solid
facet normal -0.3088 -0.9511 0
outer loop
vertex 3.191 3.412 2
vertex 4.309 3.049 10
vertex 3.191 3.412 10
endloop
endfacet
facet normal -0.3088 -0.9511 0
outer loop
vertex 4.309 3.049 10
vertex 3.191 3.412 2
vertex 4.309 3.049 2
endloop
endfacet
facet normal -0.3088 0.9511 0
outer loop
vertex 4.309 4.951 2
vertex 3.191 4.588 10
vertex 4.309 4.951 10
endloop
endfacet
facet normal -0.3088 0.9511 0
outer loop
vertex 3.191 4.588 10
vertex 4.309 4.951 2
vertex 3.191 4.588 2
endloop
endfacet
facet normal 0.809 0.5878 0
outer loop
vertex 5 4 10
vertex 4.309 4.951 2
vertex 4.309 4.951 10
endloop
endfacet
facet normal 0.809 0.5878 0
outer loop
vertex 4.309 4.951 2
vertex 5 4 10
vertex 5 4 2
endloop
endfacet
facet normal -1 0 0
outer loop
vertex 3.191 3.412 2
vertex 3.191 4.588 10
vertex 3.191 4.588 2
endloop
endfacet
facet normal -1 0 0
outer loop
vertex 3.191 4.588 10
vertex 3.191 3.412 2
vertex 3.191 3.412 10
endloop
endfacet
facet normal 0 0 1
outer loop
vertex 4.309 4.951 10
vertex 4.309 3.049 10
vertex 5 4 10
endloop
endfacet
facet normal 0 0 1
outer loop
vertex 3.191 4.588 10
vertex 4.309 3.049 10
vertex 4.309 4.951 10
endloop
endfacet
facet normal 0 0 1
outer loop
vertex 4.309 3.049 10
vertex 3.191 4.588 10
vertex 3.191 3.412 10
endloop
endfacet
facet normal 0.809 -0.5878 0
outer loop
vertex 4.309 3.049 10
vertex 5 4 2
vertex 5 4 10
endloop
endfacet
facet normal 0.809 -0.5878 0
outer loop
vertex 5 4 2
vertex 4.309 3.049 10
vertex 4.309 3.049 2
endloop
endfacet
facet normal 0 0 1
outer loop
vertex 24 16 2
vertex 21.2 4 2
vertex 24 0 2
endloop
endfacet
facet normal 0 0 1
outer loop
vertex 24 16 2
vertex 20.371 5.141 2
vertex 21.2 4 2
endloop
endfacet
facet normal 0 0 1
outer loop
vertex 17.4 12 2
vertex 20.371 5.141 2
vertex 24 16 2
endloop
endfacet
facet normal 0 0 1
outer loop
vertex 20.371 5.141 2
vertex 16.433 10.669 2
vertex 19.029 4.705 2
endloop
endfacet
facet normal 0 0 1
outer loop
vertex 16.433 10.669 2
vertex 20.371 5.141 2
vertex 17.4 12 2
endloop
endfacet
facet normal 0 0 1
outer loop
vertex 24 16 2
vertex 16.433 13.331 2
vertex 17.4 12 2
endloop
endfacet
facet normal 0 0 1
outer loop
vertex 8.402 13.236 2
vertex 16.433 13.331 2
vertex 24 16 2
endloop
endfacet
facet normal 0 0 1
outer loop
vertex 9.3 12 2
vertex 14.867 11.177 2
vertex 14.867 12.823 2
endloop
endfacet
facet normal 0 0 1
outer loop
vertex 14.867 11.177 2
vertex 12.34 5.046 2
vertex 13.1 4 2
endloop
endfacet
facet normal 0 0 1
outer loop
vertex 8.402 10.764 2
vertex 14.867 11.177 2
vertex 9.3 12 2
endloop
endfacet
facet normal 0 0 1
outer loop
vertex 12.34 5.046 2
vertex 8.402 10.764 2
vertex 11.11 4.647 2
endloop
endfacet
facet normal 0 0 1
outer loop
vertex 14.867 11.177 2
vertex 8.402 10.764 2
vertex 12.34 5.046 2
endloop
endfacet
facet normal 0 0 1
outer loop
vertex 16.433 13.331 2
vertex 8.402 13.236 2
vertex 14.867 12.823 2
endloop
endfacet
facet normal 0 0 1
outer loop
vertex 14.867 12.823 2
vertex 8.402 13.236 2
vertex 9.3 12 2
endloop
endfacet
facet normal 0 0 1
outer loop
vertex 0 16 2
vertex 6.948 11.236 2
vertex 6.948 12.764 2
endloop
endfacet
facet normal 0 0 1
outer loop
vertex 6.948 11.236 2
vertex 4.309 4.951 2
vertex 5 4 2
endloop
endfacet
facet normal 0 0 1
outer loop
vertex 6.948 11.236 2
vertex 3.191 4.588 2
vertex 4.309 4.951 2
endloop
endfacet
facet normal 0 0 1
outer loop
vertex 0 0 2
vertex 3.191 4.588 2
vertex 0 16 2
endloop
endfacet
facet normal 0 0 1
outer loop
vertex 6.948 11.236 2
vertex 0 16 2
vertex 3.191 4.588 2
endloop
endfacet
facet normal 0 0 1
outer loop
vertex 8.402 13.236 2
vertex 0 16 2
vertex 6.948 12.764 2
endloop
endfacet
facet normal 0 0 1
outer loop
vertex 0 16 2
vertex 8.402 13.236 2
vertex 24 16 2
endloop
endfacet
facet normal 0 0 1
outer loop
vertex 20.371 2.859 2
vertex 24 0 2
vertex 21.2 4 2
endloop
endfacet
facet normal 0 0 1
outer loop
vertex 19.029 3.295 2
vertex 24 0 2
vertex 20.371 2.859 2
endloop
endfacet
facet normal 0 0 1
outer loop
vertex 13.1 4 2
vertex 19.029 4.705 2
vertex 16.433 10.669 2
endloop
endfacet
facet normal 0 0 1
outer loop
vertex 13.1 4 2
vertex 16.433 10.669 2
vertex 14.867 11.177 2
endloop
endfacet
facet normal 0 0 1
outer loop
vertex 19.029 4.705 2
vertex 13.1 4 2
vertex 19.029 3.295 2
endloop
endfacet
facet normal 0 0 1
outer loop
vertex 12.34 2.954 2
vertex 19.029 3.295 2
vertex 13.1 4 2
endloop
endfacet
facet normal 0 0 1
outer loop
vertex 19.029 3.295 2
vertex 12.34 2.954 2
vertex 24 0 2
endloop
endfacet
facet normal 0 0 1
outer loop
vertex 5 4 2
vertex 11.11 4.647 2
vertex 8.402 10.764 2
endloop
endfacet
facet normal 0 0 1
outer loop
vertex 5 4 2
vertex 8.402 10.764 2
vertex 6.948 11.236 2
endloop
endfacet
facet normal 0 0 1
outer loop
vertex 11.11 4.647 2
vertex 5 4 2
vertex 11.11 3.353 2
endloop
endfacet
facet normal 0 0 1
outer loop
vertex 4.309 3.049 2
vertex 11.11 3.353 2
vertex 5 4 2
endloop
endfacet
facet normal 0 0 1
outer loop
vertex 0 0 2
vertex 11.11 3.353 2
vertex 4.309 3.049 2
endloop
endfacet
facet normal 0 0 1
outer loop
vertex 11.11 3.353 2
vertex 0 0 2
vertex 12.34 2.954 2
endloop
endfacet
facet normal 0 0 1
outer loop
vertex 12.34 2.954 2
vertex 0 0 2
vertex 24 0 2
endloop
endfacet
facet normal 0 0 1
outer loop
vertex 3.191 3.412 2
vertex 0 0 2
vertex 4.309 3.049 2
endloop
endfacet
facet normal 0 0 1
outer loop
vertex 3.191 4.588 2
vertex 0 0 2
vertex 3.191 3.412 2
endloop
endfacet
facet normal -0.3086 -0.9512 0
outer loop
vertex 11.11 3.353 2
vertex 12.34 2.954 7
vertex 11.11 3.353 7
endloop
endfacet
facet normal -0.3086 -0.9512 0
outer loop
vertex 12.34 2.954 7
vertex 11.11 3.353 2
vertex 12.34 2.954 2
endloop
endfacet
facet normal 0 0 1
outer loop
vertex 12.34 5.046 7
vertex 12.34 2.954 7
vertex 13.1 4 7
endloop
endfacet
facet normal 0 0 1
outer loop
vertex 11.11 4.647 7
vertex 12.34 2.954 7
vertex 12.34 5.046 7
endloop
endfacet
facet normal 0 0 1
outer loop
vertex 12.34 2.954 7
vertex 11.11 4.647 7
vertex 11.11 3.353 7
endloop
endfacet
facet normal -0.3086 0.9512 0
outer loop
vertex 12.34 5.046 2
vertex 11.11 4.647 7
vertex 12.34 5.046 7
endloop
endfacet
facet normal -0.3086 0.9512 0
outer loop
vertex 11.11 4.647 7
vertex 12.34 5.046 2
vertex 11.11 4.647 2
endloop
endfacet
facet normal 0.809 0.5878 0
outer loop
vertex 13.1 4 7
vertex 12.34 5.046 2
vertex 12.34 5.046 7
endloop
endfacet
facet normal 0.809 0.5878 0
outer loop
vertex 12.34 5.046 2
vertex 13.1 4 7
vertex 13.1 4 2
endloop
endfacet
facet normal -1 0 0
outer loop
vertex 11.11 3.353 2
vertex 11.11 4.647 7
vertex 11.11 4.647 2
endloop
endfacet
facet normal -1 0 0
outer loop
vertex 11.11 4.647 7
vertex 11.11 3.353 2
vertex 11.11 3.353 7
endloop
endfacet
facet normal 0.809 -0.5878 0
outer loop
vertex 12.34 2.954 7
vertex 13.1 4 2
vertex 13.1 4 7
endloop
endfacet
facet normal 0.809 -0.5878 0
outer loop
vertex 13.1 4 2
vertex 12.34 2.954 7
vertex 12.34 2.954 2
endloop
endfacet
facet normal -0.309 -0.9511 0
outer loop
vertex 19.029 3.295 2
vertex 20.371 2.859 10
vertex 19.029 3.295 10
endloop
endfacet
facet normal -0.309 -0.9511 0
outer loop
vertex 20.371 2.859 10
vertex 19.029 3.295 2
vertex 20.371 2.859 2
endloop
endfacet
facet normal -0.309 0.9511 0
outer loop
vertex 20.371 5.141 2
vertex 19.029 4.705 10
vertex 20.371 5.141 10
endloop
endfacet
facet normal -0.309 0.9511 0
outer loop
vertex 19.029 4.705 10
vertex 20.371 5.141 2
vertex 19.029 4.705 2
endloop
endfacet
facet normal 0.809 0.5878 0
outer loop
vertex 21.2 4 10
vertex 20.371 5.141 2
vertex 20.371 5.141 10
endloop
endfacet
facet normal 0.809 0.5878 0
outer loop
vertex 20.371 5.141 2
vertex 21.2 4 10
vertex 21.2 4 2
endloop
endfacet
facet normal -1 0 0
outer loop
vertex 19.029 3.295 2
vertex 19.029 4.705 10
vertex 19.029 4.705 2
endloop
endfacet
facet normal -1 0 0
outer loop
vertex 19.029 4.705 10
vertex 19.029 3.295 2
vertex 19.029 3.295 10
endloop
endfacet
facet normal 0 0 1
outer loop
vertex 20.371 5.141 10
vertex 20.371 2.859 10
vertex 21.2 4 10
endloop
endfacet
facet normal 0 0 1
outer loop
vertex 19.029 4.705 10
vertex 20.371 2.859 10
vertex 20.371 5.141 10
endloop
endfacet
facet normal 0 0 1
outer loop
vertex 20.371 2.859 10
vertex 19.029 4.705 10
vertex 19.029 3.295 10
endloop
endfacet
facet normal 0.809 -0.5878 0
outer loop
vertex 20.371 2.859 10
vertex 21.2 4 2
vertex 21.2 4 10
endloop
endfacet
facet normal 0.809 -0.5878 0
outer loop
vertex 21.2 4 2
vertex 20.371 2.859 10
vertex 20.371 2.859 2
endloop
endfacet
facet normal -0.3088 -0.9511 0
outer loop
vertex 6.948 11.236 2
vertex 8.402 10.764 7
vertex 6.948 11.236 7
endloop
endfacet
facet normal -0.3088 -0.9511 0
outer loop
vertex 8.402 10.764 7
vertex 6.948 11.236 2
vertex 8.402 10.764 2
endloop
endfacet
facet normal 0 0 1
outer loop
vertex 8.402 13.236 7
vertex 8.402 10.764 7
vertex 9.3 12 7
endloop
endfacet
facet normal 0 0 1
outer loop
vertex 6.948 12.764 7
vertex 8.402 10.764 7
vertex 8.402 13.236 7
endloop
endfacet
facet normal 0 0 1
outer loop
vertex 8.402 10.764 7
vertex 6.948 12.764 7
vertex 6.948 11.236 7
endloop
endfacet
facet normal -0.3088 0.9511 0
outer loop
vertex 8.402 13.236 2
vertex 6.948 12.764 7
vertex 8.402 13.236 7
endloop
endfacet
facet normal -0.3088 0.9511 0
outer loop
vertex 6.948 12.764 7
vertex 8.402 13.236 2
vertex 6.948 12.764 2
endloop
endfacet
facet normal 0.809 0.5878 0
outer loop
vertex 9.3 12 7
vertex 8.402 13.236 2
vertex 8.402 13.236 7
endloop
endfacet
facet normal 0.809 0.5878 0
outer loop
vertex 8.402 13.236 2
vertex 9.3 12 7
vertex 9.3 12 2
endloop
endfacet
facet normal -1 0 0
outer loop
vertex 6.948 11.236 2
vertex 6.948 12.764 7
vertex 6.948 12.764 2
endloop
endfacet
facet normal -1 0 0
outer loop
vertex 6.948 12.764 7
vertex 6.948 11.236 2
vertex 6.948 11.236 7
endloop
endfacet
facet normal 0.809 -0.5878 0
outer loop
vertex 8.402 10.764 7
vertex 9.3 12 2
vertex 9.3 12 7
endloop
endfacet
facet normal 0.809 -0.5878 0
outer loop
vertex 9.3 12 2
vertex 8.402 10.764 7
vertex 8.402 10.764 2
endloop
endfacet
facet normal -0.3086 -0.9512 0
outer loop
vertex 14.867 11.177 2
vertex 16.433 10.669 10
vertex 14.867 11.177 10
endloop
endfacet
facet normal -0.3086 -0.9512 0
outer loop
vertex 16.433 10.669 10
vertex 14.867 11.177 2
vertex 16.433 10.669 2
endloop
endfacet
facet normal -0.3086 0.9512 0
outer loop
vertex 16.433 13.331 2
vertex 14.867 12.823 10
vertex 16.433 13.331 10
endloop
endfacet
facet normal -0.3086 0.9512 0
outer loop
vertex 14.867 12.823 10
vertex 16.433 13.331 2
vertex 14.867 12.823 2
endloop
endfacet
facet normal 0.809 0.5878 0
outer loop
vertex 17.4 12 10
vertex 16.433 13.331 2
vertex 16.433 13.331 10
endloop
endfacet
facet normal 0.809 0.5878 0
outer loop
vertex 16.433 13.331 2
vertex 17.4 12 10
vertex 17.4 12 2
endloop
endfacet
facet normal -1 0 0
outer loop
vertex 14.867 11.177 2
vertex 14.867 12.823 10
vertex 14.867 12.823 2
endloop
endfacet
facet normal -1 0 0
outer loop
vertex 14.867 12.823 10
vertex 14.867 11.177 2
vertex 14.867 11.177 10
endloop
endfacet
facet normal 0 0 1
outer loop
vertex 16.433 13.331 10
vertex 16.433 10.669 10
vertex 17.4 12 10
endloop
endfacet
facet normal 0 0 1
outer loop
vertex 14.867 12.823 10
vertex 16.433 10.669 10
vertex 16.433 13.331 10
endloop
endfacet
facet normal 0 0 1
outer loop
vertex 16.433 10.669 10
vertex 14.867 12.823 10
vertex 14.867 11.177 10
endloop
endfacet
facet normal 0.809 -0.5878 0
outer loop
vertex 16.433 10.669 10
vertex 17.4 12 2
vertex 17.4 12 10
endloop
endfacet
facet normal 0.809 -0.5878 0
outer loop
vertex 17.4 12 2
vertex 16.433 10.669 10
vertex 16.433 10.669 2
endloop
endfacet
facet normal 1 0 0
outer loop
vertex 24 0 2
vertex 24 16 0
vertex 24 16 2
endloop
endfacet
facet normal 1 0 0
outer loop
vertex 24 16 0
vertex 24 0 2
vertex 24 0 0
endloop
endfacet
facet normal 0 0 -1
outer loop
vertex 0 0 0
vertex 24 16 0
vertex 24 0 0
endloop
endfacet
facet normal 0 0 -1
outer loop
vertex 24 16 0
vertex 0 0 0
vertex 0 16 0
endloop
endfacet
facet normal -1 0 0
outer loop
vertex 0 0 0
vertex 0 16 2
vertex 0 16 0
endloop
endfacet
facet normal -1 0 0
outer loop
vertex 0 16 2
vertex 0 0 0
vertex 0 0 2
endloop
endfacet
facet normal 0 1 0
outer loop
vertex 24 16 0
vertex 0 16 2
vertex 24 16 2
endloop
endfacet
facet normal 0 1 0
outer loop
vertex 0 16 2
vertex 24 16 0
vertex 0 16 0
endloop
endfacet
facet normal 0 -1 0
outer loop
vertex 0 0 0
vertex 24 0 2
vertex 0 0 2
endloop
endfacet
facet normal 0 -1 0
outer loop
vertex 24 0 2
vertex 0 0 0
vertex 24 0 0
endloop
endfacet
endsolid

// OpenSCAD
// file: sample_lib.scad
module peg(r=2, h=10) {
  cylinder(r=r, h=h);
}

module base_plate(size=[20, 20, 2]) {
  cube(size);
}
// main file
use <sample_lib.scad>;

function pick_h(i) = i % 2 == 0 ? 8 : 5;
pts = [[4,4], [12,4], [20,4], [8,12], [16,12]];

union() {
  base_plate(size=[24, 16, 2]);
  for (i = [0:4]) {
    translate([pts[i][0], pts[i][1], 2])
      peg(r=1 + i * 0.1, h=pick_h(i));
  }
}
